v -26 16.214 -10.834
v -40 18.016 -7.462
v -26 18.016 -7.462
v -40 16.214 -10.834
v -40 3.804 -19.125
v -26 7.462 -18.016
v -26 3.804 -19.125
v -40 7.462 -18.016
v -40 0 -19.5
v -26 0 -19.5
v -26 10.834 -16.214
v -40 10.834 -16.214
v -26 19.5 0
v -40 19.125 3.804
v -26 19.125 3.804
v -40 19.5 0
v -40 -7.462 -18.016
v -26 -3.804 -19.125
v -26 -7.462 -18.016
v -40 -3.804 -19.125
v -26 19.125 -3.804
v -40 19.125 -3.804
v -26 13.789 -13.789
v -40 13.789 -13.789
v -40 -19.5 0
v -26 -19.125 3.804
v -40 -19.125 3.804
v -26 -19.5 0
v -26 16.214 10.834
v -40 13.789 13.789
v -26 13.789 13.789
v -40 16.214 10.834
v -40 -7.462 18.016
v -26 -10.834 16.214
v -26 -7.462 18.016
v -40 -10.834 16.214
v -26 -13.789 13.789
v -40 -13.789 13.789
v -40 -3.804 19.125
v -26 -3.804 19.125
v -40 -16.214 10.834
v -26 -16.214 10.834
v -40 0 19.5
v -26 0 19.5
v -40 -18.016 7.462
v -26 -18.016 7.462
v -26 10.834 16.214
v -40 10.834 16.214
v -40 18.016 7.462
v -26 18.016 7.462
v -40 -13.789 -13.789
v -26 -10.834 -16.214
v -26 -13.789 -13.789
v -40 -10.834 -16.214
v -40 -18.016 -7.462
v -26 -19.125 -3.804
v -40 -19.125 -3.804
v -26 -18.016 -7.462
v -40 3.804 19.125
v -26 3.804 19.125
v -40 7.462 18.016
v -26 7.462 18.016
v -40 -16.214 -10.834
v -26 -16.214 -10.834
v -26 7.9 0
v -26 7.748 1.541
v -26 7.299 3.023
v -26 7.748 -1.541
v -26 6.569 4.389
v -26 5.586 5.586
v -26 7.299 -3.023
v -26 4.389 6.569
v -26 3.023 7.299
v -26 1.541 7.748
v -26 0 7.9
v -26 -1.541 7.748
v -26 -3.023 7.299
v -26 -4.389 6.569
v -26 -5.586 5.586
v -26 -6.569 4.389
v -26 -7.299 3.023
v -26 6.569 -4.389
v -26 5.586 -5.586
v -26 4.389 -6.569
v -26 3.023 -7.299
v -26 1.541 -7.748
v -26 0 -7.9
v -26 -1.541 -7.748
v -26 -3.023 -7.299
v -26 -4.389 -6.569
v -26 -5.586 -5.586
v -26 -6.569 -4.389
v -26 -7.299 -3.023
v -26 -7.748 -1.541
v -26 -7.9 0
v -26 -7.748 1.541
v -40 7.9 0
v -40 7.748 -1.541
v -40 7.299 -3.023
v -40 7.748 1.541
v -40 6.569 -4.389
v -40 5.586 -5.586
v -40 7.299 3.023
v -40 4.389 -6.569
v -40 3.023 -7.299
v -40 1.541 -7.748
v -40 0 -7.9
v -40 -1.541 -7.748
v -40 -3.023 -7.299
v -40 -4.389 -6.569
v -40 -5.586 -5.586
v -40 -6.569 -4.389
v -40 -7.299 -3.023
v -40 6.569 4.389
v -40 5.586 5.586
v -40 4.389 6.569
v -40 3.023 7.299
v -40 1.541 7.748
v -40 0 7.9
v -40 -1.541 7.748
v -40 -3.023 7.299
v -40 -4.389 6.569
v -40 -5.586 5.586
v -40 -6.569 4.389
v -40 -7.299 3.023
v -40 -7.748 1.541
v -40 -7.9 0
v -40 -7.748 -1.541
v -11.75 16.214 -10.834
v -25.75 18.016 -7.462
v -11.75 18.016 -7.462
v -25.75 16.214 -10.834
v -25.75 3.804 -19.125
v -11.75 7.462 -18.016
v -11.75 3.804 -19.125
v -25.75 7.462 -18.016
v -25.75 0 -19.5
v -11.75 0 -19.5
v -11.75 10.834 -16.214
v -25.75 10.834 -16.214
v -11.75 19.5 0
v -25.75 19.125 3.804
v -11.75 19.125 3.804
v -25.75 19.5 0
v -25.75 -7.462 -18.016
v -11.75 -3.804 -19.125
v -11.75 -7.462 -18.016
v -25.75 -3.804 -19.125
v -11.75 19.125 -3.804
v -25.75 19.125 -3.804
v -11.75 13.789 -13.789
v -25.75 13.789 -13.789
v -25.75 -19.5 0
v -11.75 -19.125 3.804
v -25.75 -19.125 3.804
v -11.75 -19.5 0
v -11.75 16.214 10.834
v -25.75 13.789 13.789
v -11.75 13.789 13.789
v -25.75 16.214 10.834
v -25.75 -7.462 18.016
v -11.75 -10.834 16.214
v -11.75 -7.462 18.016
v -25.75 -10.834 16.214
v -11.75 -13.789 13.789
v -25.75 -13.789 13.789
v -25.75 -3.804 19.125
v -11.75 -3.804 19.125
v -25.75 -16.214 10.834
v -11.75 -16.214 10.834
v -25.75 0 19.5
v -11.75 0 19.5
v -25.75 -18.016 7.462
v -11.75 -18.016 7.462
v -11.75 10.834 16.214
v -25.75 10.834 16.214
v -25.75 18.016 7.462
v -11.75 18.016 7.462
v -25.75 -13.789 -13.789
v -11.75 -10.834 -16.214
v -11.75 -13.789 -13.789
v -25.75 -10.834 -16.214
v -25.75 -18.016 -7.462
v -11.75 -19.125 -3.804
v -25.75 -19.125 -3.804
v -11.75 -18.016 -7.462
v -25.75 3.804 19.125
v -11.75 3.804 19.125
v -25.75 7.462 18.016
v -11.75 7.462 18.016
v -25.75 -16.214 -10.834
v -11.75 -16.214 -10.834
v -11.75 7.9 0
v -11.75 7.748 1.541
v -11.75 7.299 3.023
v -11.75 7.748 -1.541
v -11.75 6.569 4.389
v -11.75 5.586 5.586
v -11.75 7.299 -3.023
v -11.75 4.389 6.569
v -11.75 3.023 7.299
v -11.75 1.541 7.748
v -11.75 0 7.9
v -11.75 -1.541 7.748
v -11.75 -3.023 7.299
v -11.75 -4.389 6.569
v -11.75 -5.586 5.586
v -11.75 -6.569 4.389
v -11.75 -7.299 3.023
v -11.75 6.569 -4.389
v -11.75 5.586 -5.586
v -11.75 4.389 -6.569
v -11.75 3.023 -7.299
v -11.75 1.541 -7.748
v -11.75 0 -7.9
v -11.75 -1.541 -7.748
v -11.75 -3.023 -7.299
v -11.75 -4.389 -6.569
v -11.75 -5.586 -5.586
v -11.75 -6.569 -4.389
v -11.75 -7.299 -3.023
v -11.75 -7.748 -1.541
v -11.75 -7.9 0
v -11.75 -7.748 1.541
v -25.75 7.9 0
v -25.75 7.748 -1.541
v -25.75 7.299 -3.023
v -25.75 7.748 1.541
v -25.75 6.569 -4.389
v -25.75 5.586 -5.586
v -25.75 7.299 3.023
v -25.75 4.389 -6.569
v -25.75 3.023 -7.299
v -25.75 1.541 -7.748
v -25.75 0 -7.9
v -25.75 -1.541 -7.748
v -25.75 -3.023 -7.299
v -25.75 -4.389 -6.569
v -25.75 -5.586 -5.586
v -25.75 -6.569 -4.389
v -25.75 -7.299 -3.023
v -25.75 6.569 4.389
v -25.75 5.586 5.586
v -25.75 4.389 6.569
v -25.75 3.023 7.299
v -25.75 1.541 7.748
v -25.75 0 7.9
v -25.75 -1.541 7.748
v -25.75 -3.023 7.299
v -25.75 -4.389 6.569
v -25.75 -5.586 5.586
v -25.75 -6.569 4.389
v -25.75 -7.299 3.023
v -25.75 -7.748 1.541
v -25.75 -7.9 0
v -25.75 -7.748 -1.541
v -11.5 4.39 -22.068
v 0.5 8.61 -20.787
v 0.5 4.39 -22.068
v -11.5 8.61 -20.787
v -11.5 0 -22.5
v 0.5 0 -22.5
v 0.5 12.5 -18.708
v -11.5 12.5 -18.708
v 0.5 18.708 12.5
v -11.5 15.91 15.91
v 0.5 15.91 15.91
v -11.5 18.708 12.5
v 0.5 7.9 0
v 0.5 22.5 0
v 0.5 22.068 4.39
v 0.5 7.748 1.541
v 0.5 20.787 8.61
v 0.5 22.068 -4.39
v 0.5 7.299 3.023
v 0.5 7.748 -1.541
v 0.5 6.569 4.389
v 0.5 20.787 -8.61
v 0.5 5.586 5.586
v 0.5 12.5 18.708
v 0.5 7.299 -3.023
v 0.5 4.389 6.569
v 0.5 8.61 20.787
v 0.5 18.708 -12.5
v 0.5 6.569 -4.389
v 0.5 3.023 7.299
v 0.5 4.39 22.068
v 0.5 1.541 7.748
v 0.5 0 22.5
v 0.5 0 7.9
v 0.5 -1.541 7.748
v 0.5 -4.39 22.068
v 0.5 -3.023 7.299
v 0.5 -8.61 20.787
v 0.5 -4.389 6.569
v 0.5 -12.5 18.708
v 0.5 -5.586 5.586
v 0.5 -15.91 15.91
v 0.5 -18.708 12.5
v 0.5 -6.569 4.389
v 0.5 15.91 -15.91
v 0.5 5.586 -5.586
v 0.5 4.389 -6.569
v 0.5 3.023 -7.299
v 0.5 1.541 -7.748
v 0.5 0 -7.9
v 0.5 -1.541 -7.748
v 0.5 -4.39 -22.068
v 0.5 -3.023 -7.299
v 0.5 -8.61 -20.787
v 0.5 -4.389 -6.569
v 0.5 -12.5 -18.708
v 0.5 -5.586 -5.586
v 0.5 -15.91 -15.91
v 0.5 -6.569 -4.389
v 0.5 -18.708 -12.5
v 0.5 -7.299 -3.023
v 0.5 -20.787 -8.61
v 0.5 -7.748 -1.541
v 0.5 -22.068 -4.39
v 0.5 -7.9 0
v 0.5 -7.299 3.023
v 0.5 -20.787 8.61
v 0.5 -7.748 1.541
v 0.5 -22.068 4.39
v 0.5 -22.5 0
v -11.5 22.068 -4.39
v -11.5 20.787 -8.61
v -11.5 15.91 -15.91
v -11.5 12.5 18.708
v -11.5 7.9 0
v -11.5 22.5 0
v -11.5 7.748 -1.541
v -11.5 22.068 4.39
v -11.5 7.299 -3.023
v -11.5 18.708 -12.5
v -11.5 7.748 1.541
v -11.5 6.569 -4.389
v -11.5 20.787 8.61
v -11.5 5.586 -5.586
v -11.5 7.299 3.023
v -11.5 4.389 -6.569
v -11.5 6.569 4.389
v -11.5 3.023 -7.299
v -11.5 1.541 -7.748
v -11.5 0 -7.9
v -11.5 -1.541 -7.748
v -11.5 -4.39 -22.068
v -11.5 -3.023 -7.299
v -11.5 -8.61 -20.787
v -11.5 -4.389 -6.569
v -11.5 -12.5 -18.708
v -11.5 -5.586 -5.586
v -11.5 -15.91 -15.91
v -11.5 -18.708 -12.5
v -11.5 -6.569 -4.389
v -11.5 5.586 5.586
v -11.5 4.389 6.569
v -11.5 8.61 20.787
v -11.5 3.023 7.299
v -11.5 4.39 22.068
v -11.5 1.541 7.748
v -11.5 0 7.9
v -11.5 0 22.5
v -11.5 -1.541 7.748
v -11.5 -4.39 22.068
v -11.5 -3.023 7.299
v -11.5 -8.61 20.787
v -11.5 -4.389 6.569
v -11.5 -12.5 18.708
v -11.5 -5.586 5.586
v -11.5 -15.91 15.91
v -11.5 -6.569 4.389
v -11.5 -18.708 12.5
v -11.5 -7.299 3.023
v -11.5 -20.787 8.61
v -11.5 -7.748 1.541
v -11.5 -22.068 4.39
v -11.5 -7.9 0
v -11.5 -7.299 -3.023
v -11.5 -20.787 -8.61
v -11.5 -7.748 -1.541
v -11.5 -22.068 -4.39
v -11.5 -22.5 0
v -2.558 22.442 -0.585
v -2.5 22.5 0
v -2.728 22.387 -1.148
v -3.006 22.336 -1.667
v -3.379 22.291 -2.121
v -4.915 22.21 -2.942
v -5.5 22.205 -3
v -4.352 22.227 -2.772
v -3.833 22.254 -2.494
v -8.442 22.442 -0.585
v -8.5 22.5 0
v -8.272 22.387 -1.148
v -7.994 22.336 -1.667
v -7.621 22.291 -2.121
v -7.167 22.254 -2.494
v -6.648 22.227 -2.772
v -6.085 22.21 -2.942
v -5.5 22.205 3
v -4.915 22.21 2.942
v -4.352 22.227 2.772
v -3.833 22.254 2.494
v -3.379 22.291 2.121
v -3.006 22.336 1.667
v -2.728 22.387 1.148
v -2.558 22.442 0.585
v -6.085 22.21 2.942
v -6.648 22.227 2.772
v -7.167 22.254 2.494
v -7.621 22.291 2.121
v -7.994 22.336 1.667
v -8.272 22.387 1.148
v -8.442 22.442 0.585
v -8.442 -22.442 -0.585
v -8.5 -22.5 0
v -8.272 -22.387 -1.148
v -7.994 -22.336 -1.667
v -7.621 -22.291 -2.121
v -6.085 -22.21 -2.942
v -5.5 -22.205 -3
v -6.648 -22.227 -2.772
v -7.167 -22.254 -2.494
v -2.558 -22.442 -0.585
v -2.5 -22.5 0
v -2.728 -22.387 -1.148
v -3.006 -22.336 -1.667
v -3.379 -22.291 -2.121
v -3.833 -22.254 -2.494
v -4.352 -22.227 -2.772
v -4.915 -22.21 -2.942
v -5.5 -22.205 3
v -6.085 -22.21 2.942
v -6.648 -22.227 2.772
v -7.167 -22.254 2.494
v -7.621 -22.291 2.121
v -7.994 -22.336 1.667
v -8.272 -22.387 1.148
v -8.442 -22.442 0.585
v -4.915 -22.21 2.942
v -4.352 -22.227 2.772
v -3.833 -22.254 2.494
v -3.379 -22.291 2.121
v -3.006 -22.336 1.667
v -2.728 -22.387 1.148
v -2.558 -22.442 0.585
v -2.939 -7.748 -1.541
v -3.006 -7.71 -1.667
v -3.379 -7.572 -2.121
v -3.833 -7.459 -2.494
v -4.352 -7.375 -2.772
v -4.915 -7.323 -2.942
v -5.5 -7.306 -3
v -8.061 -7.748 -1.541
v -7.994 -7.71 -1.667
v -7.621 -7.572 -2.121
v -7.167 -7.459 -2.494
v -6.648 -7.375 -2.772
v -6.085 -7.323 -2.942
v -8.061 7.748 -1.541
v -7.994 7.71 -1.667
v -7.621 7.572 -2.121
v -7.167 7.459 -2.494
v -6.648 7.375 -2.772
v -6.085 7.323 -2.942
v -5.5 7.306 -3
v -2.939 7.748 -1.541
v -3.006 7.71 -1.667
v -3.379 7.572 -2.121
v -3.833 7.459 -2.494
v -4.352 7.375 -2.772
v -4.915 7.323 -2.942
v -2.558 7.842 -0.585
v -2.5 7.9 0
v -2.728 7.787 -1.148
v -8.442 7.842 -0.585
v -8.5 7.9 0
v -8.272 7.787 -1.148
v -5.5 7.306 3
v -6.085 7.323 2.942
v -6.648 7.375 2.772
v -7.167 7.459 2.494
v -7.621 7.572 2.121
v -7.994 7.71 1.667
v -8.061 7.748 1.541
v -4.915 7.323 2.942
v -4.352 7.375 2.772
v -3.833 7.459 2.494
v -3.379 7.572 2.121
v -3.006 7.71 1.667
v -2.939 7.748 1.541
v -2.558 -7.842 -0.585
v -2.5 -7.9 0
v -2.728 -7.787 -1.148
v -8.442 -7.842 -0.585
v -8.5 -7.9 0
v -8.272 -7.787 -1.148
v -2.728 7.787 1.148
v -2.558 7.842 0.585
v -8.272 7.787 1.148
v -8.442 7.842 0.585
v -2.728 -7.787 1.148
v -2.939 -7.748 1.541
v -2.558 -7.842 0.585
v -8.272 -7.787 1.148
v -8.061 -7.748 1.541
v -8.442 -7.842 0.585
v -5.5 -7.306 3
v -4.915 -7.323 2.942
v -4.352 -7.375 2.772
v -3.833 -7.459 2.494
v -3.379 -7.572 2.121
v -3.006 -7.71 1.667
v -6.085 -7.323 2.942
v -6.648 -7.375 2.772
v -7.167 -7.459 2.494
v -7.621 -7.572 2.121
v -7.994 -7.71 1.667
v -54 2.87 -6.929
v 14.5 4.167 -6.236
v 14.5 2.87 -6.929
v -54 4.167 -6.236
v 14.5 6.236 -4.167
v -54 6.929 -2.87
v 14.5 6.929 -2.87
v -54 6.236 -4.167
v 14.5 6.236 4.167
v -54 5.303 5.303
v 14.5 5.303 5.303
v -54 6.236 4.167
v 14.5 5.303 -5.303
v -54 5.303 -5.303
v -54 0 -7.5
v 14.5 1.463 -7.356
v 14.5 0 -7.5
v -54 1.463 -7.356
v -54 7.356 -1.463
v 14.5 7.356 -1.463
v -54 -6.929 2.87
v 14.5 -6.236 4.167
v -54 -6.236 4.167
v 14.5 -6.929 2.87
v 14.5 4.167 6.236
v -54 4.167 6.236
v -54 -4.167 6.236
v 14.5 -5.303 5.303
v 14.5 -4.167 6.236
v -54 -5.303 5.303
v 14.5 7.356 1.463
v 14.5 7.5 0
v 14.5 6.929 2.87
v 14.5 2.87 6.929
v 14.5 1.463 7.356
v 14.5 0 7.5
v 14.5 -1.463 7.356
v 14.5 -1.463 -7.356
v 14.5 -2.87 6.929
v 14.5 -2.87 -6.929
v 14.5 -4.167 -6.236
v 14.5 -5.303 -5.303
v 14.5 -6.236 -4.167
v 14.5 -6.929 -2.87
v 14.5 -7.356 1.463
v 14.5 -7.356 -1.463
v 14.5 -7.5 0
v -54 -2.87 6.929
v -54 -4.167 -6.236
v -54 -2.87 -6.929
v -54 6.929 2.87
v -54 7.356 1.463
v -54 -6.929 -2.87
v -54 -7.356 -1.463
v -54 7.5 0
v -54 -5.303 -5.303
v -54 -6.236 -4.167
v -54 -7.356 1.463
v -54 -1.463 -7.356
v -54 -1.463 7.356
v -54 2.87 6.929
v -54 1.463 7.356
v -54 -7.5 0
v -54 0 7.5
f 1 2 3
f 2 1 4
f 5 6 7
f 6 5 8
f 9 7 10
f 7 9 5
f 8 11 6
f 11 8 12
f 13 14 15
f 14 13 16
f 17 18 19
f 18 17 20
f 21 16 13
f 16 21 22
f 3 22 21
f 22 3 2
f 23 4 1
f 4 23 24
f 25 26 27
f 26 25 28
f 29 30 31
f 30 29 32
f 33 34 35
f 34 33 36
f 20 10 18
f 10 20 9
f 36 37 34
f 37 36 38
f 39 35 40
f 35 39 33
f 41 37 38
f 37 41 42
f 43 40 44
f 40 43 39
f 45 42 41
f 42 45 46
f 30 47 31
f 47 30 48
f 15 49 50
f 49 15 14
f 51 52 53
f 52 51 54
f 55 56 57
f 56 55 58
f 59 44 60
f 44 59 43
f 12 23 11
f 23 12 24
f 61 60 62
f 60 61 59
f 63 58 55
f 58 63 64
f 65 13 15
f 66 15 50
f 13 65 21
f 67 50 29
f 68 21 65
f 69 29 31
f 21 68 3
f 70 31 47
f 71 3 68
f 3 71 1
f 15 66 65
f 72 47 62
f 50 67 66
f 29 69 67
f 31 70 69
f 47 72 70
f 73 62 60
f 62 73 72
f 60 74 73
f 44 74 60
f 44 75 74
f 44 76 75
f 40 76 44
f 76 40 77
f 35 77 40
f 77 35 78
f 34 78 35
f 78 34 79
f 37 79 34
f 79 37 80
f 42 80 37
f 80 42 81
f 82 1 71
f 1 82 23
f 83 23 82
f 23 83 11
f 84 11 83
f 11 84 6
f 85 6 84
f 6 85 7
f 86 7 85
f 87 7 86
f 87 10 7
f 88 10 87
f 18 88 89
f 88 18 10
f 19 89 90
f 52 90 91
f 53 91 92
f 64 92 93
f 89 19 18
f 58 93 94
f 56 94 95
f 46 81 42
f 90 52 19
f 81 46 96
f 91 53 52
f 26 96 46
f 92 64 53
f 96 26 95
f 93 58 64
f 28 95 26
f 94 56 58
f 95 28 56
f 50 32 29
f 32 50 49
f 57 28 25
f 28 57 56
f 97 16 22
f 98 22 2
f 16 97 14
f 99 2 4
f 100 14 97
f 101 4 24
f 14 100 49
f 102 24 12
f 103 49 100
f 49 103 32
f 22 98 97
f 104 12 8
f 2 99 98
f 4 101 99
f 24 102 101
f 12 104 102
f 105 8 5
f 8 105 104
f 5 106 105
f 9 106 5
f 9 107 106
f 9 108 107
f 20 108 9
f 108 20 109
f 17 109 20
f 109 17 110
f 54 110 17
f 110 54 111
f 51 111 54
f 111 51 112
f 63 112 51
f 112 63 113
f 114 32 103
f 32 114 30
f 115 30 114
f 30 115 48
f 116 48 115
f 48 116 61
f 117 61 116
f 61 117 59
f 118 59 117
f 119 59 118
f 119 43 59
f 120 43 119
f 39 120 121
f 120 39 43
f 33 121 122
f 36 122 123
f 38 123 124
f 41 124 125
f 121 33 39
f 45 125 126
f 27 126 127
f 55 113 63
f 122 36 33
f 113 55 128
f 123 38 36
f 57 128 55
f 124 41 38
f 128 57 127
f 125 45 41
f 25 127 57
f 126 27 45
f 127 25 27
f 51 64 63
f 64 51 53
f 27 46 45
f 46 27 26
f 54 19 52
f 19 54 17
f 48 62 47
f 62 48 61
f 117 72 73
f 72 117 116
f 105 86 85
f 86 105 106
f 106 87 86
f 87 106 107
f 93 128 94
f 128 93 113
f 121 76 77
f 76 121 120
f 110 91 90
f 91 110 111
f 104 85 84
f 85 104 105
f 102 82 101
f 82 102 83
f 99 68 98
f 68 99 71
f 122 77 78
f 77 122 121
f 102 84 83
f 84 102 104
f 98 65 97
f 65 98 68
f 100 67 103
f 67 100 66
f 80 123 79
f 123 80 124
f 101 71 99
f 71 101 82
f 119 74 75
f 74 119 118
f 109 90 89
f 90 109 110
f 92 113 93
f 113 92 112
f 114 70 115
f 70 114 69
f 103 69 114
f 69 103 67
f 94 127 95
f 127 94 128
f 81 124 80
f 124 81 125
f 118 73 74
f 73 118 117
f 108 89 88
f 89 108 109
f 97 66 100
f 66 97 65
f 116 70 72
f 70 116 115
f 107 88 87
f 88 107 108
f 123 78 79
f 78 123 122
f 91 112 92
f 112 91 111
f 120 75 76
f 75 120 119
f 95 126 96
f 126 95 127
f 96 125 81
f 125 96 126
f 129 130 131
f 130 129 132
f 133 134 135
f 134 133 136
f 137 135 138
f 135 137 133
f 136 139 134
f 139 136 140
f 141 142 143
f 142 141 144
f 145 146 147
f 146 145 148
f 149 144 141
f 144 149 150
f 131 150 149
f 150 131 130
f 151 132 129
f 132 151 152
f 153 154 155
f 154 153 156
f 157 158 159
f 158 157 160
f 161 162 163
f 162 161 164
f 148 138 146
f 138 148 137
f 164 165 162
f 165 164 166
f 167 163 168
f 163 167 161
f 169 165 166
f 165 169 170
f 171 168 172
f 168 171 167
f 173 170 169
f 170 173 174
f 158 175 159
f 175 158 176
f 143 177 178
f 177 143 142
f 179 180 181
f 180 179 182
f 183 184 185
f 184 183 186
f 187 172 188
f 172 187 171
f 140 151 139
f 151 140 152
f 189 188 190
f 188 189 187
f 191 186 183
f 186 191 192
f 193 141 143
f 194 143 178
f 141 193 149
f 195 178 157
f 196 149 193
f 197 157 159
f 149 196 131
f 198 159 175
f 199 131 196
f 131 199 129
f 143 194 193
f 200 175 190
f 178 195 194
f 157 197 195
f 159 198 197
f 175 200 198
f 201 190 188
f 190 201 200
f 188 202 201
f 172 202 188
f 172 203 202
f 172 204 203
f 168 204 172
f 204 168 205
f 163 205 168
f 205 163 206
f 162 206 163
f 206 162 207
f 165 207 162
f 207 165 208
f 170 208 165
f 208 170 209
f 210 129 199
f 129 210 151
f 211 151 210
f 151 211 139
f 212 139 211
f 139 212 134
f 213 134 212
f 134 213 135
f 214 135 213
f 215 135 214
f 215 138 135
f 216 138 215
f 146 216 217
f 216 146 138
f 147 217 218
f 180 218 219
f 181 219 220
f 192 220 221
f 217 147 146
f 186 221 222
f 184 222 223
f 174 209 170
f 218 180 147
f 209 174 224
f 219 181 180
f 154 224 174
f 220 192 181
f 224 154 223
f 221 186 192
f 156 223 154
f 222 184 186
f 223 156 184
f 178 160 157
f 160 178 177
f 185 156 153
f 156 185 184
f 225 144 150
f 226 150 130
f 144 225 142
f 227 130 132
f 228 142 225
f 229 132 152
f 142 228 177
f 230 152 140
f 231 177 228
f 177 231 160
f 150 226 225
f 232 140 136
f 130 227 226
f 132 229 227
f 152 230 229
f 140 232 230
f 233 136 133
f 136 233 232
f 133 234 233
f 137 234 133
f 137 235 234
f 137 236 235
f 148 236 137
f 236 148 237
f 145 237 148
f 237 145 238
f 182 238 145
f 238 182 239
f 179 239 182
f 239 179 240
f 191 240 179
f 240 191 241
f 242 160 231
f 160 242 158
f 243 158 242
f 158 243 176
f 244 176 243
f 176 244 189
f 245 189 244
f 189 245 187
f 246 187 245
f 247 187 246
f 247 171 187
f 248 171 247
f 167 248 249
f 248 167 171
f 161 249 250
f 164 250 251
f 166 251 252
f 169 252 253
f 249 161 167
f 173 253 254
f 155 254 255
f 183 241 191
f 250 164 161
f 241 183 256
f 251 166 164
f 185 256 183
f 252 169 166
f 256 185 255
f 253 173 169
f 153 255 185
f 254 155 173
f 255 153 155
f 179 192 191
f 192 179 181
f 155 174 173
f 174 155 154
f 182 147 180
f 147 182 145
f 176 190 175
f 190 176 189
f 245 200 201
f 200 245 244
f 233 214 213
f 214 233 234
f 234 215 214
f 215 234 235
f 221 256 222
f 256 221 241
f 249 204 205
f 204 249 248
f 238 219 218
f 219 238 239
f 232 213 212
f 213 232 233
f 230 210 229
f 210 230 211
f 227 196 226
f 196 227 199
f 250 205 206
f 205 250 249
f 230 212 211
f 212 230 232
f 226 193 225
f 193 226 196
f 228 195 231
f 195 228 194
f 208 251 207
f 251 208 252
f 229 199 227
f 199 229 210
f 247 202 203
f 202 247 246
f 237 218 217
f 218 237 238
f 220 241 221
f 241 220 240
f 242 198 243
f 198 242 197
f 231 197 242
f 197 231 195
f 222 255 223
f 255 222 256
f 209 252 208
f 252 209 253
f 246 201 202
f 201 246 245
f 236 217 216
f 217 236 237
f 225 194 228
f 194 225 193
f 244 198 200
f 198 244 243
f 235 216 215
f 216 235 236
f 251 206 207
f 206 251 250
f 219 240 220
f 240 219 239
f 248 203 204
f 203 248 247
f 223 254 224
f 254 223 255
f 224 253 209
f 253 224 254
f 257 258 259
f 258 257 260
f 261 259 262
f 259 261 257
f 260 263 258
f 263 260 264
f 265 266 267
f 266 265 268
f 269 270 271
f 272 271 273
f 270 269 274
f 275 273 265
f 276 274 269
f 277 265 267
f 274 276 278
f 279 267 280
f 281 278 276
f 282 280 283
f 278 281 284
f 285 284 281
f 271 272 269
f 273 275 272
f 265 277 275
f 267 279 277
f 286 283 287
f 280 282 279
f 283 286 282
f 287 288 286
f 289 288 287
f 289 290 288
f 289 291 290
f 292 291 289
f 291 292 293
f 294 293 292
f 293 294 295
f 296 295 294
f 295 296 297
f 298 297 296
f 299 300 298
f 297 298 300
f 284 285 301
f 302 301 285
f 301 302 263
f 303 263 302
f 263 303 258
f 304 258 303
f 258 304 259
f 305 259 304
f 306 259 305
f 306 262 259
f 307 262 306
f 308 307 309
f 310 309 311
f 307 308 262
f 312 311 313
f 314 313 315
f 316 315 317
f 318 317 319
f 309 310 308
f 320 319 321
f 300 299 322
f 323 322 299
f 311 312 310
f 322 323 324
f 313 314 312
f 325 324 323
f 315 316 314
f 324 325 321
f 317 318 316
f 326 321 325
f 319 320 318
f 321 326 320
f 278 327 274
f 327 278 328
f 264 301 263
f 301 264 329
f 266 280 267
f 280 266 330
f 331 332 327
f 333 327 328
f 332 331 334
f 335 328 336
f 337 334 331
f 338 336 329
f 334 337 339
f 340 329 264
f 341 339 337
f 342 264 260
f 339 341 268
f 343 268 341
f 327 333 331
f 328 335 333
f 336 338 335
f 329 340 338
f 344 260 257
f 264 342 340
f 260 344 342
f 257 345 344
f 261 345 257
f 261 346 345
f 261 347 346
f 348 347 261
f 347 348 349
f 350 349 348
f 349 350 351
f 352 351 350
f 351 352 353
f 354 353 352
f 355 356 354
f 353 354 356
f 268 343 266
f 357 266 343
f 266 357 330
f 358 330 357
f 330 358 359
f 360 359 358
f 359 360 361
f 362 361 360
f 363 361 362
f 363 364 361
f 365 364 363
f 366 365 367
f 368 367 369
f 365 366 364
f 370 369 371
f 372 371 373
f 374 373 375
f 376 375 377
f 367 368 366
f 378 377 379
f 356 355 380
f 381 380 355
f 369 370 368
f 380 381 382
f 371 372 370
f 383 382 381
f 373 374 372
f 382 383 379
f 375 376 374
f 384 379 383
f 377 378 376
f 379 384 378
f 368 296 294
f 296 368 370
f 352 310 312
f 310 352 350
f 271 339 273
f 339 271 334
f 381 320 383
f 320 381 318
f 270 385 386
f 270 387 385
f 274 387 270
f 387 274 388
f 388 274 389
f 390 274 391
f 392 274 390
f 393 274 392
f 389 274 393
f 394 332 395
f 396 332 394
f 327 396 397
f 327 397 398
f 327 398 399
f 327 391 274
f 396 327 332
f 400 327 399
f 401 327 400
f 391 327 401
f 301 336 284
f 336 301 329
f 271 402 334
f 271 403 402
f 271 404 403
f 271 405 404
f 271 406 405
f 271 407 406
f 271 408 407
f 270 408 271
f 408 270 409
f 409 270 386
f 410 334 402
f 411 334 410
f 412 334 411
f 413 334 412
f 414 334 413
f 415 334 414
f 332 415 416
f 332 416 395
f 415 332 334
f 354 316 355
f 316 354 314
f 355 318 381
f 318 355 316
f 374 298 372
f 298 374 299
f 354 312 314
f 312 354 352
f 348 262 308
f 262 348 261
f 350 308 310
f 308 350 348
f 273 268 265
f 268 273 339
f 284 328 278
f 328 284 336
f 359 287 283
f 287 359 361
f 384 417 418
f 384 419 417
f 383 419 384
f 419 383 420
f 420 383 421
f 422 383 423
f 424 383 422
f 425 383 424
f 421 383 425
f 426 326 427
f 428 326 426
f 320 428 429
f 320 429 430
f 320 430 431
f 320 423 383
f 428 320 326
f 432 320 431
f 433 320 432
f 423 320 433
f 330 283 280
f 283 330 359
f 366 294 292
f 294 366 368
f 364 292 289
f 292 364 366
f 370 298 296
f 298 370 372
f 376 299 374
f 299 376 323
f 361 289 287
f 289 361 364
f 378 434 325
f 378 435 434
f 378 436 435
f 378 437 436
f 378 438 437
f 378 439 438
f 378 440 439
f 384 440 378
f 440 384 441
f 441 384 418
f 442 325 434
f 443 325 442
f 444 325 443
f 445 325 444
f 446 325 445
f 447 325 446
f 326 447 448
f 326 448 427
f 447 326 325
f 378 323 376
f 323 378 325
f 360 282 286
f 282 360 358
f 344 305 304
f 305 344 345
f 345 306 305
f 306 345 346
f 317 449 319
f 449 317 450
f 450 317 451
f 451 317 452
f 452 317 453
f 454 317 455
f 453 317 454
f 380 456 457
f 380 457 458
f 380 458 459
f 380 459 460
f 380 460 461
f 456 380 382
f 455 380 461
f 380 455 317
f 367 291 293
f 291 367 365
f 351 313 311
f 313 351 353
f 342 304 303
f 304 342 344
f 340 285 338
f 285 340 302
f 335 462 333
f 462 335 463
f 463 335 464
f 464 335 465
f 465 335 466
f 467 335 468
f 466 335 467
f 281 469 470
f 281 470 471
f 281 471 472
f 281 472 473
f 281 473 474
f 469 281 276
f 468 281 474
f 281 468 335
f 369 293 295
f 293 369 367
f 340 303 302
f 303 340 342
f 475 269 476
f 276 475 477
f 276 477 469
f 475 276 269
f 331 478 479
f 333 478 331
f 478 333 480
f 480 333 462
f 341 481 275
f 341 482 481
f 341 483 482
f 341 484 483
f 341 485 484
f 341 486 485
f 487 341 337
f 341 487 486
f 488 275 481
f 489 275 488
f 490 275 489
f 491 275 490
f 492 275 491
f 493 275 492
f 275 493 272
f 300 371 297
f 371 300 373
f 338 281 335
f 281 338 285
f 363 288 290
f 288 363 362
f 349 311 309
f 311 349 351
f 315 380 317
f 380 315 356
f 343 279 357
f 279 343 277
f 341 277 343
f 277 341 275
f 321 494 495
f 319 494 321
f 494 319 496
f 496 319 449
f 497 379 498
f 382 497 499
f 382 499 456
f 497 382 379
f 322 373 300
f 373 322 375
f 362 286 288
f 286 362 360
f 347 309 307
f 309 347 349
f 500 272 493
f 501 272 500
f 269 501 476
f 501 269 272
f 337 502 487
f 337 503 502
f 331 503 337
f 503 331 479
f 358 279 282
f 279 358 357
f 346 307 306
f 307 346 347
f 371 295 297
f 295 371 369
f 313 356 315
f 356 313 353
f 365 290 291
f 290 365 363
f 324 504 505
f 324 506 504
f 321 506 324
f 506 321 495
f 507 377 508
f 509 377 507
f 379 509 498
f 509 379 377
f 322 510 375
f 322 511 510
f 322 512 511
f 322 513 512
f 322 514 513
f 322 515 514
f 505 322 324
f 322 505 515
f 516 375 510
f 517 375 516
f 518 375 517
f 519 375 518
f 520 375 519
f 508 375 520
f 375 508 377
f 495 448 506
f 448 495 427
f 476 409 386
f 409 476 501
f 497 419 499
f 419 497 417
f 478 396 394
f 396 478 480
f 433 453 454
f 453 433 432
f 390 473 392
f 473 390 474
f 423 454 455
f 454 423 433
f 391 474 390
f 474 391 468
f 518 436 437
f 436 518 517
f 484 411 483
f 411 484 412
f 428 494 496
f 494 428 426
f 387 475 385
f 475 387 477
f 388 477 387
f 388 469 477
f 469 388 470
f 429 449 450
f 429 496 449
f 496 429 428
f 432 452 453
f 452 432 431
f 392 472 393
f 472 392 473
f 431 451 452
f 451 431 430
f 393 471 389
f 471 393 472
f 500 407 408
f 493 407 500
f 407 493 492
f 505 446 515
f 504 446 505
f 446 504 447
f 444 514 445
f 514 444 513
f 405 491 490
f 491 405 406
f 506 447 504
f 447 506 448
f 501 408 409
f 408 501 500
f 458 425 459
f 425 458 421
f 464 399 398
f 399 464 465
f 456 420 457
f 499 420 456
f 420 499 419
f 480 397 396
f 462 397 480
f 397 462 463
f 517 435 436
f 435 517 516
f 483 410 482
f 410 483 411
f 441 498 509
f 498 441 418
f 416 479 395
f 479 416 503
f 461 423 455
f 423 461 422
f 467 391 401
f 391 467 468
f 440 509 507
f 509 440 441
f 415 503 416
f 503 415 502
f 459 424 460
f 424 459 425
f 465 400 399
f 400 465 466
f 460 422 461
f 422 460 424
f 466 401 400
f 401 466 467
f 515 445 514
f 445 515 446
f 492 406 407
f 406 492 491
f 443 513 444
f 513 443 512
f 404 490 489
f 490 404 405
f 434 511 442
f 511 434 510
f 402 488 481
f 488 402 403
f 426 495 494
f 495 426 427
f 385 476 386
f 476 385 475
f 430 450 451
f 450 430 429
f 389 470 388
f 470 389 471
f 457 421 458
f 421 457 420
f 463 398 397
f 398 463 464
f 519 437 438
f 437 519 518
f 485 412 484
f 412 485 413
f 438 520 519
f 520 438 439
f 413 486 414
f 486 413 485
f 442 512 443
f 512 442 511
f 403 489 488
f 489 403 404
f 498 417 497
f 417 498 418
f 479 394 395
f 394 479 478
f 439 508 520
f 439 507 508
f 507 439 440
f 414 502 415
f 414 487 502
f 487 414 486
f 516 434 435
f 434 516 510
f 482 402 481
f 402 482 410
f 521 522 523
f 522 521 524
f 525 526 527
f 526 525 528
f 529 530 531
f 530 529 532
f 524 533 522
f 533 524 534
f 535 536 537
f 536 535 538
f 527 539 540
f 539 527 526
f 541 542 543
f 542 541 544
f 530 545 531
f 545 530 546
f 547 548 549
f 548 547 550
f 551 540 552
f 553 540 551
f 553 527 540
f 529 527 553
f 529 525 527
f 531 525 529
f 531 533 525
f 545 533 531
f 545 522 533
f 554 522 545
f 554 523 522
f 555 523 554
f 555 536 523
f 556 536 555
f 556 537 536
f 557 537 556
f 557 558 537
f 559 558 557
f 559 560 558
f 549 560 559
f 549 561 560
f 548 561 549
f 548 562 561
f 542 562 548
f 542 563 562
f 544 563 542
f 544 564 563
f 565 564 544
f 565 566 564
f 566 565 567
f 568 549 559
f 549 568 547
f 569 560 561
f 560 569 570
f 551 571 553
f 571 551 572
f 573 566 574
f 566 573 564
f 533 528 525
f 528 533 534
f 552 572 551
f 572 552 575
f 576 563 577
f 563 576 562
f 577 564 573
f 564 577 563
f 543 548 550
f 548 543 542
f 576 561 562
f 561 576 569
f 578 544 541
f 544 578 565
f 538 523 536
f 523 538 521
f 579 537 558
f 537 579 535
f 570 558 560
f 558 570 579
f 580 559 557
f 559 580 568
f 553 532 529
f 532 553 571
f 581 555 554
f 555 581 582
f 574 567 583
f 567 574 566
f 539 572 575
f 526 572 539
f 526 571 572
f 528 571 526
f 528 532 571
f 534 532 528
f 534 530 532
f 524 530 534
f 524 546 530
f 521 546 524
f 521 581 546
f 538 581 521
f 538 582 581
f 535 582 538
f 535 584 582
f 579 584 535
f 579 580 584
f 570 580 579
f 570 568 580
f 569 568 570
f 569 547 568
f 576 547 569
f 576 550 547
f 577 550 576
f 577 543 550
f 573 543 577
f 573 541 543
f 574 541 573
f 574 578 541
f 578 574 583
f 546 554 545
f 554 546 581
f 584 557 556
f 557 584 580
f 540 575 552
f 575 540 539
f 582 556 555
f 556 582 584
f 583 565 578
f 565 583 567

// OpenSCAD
$fn = 32;

// ------------------------------------------------------------------------
// Shaft with rings and collars: d15 shaft, 3 rings
// Every part is its own module, assembly() places them once.
// ------------------------------------------------------------------------

// --- part 1 ---
module shaft() {
  translate([0, 0, -34.25]) cylinder(h = 68.5, d = 15);
}

// --- part 2 ---
module spacer_a() {
  difference() {
      translate([0, 0, 0]) cylinder(h = 14, d = 39);
      translate([0, 0, -1]) cylinder(h = 16, d = 15.8);
    }
}

// --- part 3 ---
module spacer_b() {
  difference() {
      translate([0, 0, 0]) cylinder(h = 14, d = 39);
      translate([0, 0, -1]) cylinder(h = 16, d = 15.8);
    }
}

// --- part 4 ---
module collar_a() {
  difference() {
    cylinder(h = 12, d = 45);
    translate([0, 0, -1]) cylinder(h = 14, d = 15.8);
    translate([0, 0, 6]) rotate([90, 0, 0]) cylinder(h = 47, d = 6, center = true);
  }
}

// --- assembly ---
module assembly() {
  translate([-19.75, 0, 0]) rotate([0, 90, 0]) shaft();
  translate([-40, 0, 0]) rotate([0, 90, 0]) spacer_a();
  translate([-25.75, 0, 0]) rotate([0, 90, 0]) spacer_b();
  translate([-11.5, 0, 0]) rotate([0, 90, 0]) collar_a();
}

assembly();
